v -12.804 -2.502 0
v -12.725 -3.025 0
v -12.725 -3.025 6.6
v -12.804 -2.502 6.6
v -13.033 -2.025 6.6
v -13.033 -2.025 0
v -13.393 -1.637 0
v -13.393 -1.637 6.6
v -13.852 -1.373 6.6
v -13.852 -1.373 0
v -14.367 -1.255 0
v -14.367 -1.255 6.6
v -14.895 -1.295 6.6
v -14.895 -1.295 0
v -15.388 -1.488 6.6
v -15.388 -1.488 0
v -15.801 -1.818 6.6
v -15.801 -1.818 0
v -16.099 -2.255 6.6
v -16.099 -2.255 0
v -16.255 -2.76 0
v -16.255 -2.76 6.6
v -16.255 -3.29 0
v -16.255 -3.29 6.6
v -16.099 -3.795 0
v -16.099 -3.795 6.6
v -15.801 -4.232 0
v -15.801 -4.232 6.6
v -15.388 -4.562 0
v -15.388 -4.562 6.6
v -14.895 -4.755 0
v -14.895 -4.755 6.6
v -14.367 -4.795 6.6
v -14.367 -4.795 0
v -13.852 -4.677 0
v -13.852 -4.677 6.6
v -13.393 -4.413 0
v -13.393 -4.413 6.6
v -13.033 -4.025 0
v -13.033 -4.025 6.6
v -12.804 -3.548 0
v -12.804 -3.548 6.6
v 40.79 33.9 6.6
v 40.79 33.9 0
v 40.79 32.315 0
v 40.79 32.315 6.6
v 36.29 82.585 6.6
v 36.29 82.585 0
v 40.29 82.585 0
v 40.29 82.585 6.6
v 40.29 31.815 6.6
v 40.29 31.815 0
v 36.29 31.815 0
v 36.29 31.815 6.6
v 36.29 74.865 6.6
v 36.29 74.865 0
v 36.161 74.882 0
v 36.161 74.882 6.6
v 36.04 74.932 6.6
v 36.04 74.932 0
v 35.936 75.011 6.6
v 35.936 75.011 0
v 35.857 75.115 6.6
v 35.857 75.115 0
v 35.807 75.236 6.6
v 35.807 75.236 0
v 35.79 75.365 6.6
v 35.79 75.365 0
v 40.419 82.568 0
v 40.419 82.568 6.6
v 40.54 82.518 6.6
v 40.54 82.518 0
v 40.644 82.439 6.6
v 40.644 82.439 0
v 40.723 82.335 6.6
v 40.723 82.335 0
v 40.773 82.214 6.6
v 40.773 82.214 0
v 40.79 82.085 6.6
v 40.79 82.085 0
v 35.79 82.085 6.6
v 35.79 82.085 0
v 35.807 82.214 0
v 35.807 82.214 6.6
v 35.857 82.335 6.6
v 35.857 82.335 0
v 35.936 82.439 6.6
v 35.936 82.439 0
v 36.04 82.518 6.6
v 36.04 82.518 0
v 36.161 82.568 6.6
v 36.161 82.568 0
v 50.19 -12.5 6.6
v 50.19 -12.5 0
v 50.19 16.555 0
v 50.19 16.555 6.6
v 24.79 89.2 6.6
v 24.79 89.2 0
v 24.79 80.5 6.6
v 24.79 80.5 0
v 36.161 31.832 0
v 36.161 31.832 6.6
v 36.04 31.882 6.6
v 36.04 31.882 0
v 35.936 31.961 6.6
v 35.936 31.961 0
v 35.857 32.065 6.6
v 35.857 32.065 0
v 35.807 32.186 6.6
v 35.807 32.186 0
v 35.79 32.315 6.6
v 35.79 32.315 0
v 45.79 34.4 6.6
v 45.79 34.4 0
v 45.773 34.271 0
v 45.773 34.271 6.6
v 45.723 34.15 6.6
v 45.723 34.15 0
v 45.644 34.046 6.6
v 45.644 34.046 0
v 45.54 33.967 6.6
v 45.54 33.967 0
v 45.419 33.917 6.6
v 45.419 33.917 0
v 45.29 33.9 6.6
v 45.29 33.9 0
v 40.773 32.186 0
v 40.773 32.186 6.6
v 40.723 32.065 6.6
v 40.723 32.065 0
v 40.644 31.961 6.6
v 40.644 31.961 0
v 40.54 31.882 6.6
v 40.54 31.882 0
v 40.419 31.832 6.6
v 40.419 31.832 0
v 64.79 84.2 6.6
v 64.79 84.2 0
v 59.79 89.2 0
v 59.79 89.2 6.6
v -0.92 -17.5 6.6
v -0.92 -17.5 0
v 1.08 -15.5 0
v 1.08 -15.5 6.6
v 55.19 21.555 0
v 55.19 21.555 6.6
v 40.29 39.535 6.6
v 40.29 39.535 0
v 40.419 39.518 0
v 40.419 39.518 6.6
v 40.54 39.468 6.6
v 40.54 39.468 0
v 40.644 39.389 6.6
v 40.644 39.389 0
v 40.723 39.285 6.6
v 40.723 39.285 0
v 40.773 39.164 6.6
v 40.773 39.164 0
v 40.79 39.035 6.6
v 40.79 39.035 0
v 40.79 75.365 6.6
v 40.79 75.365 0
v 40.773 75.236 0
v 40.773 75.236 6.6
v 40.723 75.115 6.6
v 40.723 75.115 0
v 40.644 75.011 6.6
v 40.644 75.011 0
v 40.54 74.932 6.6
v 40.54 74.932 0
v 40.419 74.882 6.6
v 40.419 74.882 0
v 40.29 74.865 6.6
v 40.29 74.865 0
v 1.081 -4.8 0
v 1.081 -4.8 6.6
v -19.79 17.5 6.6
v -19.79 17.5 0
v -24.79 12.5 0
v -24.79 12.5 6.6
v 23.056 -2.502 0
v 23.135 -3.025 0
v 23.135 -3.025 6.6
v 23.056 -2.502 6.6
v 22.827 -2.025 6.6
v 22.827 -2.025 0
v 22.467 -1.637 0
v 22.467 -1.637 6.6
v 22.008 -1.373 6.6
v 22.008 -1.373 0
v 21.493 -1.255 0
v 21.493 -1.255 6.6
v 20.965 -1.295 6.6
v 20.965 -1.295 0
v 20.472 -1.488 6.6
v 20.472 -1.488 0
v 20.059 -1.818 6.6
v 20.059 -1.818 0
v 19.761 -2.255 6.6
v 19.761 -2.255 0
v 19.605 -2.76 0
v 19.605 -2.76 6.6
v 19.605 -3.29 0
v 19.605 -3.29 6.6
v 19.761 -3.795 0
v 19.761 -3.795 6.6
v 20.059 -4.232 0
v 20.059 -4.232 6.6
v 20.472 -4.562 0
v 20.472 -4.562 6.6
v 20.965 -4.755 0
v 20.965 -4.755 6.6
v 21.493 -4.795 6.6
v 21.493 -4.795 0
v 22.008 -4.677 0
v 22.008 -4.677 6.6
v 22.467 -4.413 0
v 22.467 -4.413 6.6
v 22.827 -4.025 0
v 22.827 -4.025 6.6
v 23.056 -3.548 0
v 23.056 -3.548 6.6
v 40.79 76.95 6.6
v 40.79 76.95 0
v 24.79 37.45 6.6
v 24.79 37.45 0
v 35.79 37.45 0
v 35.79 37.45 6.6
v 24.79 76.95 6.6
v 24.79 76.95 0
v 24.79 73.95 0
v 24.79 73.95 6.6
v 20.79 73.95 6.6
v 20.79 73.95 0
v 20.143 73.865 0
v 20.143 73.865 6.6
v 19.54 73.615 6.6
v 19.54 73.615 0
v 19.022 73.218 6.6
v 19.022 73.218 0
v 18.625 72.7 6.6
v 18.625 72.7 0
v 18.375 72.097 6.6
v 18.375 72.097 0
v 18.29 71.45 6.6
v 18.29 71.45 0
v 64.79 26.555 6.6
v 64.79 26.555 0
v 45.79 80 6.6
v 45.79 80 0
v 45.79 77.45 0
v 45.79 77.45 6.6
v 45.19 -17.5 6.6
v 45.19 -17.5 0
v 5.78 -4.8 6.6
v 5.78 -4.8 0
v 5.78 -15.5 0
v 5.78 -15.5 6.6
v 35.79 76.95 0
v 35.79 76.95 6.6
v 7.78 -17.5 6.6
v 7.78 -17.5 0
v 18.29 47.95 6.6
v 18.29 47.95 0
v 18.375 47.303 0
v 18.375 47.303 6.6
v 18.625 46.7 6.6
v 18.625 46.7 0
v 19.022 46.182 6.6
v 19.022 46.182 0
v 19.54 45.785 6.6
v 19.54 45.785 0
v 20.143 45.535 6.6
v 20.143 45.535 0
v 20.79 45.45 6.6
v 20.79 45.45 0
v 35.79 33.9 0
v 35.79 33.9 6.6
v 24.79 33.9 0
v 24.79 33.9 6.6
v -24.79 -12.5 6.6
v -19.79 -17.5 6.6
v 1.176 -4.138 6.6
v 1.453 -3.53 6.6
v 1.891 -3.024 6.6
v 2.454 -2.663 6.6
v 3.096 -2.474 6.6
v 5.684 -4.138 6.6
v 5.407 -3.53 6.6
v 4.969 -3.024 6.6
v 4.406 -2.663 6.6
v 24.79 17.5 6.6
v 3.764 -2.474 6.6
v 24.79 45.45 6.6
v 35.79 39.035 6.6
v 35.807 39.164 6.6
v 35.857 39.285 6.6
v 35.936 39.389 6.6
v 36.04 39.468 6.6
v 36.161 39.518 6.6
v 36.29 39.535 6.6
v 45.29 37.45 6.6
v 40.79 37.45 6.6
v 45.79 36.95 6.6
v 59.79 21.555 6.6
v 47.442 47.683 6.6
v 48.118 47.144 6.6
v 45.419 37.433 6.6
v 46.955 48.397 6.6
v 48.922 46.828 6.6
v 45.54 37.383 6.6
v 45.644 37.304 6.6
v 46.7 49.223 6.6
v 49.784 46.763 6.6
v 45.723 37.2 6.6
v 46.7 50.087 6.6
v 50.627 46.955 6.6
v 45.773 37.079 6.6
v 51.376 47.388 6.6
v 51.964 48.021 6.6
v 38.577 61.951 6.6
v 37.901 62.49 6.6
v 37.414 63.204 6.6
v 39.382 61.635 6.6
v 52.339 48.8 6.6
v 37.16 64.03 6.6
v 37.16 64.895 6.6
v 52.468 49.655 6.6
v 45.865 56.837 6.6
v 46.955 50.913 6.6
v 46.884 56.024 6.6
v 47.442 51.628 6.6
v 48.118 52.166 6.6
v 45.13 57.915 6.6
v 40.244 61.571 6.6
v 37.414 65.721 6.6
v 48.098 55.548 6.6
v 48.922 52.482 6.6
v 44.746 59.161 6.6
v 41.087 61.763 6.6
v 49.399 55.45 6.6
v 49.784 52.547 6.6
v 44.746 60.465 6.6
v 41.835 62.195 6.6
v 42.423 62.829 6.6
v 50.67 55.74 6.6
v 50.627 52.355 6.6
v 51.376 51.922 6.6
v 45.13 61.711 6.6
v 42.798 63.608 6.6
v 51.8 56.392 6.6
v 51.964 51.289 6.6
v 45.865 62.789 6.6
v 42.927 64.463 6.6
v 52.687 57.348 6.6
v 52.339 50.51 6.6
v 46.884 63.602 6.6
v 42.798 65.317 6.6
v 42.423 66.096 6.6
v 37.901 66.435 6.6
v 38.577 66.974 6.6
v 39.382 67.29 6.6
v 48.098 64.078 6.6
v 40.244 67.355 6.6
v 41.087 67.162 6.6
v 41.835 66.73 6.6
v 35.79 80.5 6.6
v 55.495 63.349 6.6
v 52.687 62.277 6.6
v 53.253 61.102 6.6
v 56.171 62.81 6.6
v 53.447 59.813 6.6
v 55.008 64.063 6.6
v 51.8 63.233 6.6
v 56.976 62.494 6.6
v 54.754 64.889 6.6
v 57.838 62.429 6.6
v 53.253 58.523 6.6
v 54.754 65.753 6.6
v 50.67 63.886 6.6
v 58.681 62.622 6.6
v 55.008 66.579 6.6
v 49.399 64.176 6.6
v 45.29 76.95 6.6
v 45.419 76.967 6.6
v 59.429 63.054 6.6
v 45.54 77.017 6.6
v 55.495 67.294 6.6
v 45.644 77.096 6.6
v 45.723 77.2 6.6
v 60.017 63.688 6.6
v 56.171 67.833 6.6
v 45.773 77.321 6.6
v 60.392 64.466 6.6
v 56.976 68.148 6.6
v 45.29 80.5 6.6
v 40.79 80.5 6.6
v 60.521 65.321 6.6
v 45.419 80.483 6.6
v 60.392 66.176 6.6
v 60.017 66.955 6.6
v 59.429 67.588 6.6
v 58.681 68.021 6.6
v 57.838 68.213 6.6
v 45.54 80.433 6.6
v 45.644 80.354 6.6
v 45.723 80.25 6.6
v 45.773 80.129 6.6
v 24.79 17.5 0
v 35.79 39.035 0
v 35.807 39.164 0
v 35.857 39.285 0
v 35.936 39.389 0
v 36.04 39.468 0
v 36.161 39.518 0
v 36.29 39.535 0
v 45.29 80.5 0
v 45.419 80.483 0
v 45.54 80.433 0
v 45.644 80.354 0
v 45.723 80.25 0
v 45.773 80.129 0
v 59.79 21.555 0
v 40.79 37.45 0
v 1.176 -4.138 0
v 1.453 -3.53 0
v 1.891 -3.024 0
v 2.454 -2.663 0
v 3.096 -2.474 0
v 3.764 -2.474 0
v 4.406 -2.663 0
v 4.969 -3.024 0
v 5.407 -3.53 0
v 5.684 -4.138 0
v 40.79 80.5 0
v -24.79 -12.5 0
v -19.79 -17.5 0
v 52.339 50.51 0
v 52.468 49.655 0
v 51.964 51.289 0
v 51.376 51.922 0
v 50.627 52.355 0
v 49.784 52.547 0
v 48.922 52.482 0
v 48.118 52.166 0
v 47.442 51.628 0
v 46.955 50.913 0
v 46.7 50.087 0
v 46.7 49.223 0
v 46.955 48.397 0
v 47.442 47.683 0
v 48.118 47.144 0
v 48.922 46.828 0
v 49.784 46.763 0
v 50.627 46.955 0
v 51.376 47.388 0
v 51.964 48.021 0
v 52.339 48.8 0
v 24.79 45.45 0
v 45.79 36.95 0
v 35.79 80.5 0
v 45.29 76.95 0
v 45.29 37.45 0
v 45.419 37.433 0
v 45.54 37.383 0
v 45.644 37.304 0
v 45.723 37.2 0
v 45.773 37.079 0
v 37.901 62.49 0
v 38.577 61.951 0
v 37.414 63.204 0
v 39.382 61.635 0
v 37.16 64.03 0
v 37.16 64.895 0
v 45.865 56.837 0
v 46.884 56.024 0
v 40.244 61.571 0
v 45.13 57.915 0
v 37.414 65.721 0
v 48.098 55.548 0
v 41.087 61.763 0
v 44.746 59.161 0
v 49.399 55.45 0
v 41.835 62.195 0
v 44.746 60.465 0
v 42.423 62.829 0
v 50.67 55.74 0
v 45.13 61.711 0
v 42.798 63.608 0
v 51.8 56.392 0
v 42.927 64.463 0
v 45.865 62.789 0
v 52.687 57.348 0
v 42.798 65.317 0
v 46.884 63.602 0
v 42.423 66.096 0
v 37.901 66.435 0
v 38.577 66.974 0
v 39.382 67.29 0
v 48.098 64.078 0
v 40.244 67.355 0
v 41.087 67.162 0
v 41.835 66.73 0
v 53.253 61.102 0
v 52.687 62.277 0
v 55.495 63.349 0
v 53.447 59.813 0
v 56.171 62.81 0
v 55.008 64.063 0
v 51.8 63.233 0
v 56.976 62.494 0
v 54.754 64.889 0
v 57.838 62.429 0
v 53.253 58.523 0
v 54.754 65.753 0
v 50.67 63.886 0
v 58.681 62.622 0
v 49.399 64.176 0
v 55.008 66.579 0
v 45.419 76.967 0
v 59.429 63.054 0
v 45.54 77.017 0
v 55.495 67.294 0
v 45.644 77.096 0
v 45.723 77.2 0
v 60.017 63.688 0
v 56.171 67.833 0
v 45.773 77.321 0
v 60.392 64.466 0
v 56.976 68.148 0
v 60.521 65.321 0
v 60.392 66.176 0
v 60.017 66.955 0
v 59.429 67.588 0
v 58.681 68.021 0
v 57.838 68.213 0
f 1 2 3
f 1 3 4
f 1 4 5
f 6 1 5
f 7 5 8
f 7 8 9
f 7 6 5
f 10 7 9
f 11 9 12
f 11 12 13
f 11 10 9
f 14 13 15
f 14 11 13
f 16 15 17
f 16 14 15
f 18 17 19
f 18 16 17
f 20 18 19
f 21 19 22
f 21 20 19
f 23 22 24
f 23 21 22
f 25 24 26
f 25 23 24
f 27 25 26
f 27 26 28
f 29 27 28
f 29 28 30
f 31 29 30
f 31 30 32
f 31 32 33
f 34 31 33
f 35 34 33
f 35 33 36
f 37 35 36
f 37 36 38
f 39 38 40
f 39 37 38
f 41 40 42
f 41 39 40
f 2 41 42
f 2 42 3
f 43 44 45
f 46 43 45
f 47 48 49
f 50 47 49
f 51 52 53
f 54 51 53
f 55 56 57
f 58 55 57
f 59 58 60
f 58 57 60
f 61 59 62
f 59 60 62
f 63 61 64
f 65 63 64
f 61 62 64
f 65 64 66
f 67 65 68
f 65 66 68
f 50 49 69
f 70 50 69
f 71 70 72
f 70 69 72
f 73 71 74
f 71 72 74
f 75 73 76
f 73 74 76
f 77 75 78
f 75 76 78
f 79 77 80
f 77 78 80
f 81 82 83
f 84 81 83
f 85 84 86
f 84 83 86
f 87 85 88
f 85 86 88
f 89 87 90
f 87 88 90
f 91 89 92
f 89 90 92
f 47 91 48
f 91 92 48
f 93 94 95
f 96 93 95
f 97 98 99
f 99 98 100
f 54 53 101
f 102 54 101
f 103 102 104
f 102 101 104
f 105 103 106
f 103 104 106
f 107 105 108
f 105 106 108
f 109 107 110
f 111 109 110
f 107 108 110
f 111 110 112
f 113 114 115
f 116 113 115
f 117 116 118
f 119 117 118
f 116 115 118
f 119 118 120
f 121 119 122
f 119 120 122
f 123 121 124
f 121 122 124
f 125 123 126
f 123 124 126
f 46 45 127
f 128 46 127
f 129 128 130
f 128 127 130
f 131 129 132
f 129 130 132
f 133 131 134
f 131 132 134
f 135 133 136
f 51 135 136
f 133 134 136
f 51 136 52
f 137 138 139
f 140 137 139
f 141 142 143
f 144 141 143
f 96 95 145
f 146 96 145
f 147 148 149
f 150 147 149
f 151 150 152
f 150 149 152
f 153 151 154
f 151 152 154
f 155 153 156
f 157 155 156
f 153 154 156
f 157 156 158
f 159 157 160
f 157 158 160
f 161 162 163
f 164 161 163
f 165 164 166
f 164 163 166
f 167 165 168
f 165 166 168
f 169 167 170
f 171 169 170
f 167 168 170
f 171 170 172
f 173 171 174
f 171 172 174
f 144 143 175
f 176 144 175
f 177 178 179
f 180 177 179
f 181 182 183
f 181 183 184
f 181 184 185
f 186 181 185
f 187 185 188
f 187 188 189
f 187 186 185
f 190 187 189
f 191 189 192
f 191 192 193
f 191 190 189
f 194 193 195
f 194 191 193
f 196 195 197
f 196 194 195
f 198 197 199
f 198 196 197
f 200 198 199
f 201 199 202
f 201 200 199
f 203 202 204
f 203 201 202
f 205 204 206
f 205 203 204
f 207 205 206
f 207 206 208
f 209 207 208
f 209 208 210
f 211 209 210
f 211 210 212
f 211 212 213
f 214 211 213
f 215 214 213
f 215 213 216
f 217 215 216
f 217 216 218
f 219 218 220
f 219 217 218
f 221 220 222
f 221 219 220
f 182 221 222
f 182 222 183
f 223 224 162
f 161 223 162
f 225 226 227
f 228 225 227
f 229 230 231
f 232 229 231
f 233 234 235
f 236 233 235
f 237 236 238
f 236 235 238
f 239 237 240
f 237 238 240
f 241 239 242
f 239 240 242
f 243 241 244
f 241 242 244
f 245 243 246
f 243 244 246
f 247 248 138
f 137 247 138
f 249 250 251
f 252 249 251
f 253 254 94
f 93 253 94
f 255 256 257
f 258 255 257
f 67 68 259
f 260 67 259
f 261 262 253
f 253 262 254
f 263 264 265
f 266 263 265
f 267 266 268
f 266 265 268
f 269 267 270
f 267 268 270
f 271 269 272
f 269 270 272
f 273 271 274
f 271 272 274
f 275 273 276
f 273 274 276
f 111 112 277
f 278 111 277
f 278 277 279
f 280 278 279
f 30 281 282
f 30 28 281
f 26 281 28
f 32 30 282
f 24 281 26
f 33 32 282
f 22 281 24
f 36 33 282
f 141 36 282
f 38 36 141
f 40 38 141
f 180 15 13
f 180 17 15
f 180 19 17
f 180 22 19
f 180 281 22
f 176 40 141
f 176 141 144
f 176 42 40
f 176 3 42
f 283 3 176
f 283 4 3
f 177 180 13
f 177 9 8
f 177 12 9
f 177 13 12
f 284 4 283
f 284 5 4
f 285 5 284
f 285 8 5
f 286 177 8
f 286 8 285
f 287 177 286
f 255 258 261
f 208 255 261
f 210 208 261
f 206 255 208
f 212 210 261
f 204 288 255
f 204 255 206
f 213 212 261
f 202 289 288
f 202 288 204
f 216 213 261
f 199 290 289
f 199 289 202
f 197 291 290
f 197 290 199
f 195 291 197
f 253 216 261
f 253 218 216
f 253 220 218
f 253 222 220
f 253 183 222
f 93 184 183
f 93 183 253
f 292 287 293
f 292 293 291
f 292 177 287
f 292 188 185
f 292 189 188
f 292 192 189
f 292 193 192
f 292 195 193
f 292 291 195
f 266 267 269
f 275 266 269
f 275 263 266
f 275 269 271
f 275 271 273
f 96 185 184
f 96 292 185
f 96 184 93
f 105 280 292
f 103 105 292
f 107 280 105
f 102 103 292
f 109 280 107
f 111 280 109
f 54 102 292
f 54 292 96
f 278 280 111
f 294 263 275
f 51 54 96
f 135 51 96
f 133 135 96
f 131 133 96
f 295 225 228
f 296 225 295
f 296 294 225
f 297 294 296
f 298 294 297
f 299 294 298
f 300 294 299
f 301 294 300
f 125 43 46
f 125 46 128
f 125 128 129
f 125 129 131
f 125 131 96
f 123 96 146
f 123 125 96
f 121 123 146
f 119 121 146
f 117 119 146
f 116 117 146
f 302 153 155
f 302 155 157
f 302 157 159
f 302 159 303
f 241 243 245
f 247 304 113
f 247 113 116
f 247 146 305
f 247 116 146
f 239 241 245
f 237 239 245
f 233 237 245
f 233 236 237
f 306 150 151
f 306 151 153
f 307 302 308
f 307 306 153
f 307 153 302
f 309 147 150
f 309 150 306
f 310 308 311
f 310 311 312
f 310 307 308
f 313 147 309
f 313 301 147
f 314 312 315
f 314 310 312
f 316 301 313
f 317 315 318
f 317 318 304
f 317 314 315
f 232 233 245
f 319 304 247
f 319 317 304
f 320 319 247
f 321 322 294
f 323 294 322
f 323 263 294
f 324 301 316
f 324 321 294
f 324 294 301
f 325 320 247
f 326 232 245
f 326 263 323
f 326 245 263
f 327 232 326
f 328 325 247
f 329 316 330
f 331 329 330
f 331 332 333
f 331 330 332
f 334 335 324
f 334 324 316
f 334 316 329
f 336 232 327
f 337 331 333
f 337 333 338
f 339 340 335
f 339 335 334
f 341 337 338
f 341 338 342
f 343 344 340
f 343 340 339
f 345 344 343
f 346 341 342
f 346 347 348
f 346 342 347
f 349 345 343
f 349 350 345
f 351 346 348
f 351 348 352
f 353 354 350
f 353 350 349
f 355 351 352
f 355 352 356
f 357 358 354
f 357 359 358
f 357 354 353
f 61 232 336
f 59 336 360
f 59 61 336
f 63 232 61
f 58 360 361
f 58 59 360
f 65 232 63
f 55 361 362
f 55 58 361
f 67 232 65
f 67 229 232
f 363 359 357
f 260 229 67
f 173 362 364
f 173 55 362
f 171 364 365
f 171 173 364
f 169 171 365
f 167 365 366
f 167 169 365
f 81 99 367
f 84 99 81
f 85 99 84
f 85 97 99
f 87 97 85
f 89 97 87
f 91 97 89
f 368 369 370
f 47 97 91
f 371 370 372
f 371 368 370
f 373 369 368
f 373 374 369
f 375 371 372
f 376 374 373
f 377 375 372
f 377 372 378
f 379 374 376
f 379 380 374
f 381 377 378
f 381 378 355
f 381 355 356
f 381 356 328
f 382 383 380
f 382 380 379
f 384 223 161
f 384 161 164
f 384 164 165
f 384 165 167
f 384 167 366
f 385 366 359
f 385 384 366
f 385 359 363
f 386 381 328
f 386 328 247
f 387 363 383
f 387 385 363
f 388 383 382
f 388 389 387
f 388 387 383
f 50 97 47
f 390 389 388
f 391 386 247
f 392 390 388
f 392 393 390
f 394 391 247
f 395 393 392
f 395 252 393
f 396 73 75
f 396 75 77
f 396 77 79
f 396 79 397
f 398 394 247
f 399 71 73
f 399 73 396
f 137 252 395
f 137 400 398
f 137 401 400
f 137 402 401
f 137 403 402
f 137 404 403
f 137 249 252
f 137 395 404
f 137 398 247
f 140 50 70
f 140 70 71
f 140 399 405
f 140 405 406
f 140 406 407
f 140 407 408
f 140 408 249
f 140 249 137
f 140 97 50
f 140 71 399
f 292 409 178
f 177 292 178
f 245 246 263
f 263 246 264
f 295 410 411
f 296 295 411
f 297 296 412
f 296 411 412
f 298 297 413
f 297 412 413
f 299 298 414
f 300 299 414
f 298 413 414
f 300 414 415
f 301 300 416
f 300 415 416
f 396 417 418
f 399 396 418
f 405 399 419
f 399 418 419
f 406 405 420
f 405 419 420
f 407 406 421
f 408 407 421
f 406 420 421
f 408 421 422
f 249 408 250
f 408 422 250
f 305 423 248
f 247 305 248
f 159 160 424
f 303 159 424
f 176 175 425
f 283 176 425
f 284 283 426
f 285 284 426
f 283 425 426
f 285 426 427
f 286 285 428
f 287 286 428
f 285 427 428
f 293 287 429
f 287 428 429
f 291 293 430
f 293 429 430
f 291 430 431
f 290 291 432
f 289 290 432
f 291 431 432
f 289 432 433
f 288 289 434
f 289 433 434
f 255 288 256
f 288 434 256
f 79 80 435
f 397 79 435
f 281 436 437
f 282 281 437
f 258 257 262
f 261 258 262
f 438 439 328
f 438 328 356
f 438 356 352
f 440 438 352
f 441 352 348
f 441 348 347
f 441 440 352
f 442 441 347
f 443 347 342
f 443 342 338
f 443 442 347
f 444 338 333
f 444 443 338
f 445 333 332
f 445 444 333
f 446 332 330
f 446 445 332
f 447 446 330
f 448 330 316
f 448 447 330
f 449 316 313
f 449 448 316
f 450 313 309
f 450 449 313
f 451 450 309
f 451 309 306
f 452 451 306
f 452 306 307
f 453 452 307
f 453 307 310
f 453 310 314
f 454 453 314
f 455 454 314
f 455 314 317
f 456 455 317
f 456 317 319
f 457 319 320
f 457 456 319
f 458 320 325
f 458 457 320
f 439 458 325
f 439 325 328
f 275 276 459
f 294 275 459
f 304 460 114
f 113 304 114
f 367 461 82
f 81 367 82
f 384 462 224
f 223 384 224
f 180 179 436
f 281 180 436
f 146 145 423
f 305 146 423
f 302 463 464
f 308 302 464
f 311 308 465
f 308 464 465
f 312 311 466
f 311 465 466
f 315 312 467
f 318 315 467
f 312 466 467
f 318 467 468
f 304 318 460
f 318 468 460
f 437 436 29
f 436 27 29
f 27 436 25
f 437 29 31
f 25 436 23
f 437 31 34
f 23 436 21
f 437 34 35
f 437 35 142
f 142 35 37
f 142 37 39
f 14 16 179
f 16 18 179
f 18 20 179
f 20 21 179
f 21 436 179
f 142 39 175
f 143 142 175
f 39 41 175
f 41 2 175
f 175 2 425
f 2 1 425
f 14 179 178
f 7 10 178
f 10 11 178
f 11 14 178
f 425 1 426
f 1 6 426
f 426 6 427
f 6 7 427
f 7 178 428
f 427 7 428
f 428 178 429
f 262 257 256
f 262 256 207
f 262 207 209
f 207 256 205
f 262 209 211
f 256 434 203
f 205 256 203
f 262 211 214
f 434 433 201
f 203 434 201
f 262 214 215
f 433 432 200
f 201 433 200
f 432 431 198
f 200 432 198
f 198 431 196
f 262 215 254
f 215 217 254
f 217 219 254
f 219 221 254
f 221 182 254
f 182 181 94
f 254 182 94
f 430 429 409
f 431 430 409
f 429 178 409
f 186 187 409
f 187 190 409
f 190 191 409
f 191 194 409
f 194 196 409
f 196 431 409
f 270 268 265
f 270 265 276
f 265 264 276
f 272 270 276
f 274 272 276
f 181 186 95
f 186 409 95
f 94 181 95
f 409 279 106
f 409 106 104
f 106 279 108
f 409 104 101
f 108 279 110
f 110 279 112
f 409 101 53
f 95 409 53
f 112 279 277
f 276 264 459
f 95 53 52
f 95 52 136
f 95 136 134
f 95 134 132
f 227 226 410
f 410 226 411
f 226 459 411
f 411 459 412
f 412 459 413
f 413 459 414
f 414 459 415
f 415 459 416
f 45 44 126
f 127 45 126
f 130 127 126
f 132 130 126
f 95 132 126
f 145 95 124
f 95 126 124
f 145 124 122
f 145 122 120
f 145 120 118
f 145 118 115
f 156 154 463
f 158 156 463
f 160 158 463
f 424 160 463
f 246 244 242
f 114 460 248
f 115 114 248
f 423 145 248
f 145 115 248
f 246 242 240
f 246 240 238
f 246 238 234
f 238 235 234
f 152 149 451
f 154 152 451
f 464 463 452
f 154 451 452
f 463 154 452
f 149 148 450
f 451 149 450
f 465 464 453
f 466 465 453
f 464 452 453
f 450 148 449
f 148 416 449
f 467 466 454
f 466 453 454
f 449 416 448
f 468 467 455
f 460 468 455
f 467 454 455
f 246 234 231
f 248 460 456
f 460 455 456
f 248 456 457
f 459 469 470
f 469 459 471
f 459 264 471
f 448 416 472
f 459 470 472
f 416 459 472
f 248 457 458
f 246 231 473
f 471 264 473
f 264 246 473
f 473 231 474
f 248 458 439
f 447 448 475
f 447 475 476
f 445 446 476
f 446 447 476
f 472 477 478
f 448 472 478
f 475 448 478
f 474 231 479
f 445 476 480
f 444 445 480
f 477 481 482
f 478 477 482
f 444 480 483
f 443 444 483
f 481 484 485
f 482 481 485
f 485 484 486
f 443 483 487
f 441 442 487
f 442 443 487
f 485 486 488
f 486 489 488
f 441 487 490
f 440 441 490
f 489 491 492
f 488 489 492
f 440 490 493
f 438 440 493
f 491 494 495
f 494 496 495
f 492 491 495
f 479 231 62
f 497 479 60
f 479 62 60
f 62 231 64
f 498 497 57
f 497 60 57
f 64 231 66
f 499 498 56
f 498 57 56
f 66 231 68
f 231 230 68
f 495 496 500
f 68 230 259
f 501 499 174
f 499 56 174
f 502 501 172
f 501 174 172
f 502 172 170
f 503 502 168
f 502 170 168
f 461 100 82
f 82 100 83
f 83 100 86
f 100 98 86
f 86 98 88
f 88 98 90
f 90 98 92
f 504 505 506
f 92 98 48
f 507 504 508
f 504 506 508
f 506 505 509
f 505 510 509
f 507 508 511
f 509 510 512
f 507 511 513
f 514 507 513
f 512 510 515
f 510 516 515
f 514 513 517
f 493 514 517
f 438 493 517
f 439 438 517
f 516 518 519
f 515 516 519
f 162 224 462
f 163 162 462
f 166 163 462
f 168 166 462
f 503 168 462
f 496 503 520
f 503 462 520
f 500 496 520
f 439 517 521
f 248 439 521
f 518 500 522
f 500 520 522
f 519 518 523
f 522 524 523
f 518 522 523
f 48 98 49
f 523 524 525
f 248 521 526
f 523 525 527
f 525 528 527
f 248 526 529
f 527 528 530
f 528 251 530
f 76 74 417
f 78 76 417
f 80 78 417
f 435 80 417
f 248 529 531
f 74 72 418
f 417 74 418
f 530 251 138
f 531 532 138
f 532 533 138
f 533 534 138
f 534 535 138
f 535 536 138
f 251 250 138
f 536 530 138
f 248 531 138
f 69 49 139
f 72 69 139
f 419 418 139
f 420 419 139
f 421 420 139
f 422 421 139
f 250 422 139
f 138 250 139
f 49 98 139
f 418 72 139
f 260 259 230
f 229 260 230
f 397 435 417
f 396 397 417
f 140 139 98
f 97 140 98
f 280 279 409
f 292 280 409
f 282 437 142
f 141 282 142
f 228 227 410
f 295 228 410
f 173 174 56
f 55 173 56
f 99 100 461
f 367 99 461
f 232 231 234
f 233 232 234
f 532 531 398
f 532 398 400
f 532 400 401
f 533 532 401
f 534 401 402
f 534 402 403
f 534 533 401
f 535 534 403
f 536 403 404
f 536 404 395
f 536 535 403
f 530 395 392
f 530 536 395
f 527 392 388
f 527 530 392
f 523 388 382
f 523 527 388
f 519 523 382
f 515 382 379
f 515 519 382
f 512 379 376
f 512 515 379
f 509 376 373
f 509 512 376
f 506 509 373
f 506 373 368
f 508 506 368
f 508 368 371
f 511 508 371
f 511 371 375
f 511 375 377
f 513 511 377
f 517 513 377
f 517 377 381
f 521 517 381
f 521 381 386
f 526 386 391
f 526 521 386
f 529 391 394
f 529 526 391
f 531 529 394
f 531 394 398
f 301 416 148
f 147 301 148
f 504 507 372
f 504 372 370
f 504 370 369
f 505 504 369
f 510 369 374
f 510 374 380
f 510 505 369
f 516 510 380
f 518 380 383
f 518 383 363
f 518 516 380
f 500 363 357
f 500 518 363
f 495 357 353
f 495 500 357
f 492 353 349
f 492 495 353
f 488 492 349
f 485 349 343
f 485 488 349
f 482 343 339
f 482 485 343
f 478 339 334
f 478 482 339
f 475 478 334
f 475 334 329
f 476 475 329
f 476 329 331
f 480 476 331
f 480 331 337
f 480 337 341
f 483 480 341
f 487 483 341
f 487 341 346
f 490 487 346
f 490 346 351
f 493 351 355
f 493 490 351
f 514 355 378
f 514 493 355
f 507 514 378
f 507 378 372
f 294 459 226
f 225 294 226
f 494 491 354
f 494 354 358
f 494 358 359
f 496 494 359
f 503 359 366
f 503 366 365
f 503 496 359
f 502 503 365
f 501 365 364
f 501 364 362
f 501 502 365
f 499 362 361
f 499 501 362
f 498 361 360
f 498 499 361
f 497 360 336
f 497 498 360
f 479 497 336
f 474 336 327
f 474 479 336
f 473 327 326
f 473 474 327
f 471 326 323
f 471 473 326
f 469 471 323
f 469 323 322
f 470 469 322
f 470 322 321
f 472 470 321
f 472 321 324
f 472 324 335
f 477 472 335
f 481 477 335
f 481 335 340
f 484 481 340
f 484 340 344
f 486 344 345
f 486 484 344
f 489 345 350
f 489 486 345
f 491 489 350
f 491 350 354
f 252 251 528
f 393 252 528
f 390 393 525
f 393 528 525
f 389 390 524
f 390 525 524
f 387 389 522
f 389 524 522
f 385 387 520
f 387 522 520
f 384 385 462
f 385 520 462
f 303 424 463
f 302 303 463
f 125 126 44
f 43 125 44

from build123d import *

# Parameters (mm, degrees)
MODEL_R             = 4.375
MODEL_R_2           = 2.9
MODEL_R_3           = 1.775
BOSS_EXTRUDE1_DEPTH = 6.6


with BuildPart() as part:
    # Model → Boss-Extrude1 (new body)
    with BuildSketch(Plane.XY):
        with BuildLine():
            Line((-24.79, -12.5), (-19.79, -17.5))
            Line((-19.79, -17.5), (-0.9195, -17.5))
            Line((-0.9195, -17.5), (1.0805, -15.5))
            Line((1.0805, -15.5), (1.0805, -4.8))
            ThreePointArc((1.0805, -4.8), (3.43, -2.4505), (5.7795, -4.8))
            Line((5.7795, -4.8), (5.7795, -15.5))
            Line((5.7795, -15.5), (7.7795, -17.5))
            Line((7.7795, -17.5), (45.19, -17.5))
            Line((45.19, -17.5), (50.19, -12.5))
            Line((50.19, -12.5), (50.19, 16.555))
            Line((50.19, 16.555), (55.19, 21.555))
            Line((55.19, 21.555), (59.79, 21.555))
            Line((59.79, 21.555), (64.79, 26.555))
            Line((64.79, 26.555), (64.79, 84.19991216))
            Line((64.79, 84.19991216), (59.79, 89.19991216))
            Line((59.79, 89.19991216), (24.79, 89.19991216))
            Line((24.79, 89.19991216), (24.79, 80.500006241))
            Line((24.79, 80.500006241), (35.79, 80.500006241))
            Line((35.79, 80.500006241), (35.79, 82.085006241))
            ThreePointArc((35.79, 82.085006241), (35.936446609, 82.438559632), (36.29, 82.585006241))
            Line((36.29, 82.585006241), (40.29, 82.585006241))
            ThreePointArc((40.29, 82.585006241), (40.643553391, 82.438559632), (40.79, 82.085006241))
            Line((40.79, 82.085006241), (40.79, 80.500006241))
            Line((40.79, 80.500006241), (45.29, 80.500006241))
            ThreePointArc((45.29, 80.500006241), (45.643553391, 80.353559632), (45.79, 80.000006241))
            Line((45.79, 80.000006241), (45.79, 77.450006241))
            ThreePointArc((45.79, 77.450006241), (45.643553391, 77.09645285), (45.29, 76.950006241))
            Line((45.29, 76.950006241), (40.79, 76.950006241))
            Line((40.79, 76.950006241), (40.79, 75.365006241))
            ThreePointArc((40.79, 75.365006241), (40.643553391, 75.01145285), (40.29, 74.865006241))
            Line((40.29, 74.865006241), (36.29, 74.865006241))
            ThreePointArc((36.29, 74.865006241), (35.936446609, 75.01145285), (35.79, 75.365006241))
            Line((35.79, 75.365006241), (35.79, 76.950006241))
            Line((35.79, 76.950006241), (24.79, 76.950006241))
            Line((24.79, 76.950006241), (24.79, 73.950006241))
            Line((24.79, 73.950006241), (20.79, 73.950006241))
            ThreePointArc((20.79, 73.950006241), (19.022233047, 73.217773194), (18.29, 71.450006241))
            Line((18.29, 71.450006241), (18.29, 47.950006241))
            ThreePointArc((18.29, 47.950006241), (19.022233047, 46.182239288), (20.79, 45.450006241))
            Line((20.79, 45.450006241), (24.79, 45.450006241))
            Line((24.79, 45.450006241), (24.79, 37.450006241))
            Line((24.79, 37.450006241), (35.79, 37.450006241))
            Line((35.79, 37.450006241), (35.79, 39.035006241))
            ThreePointArc((35.79, 39.035006241), (35.936446609, 39.388559632), (36.29, 39.535006241))
            Line((36.29, 39.535006241), (40.29, 39.535006241))
            ThreePointArc((40.29, 39.535006241), (40.643553391, 39.388559632), (40.79, 39.035006241))
            Line((40.79, 39.035006241), (40.79, 37.450006241))
            Line((40.79, 37.450006241), (45.29, 37.450006241))
            ThreePointArc((45.29, 37.450006241), (45.643553391, 37.303559632), (45.79, 36.950006241))
            Line((45.79, 36.950006241), (45.79, 34.400006241))
            ThreePointArc((45.79, 34.400006241), (45.643553391, 34.04645285), (45.29, 33.900006241))
            Line((45.29, 33.900006241), (40.79, 33.900006241))
            Line((40.79, 33.900006241), (40.79, 32.315006241))
            ThreePointArc((40.79, 32.315006241), (40.643553391, 31.96145285), (40.29, 31.815006241))
            Line((40.29, 31.815006241), (36.29, 31.815006241))
            ThreePointArc((36.29, 31.815006241), (35.936446609, 31.96145285), (35.79, 32.315006241))
            Line((35.79, 32.315006241), (35.79, 33.900006241))
            Line((35.79, 33.900006241), (24.79, 33.900006241))
            Line((24.79, 33.900006241), (24.79, 17.5))
            Line((24.79, 17.5), (-19.79, 17.5))
            Line((-19.79, 17.5), (-24.79, 12.5))
            Line((-24.79, 12.5), (-24.79, -12.5))
        make_face()
        with Locations((49.071999999, 59.812938251)):
            Circle(MODEL_R, mode=Mode.SUBTRACT)
        with Locations((57.621173682, 65.321162043)):
            Circle(MODEL_R_2, mode=Mode.SUBTRACT)
        with Locations((40.027151425, 64.462627946)):
            Circle(MODEL_R_2, mode=Mode.SUBTRACT)
        with Locations((49.567674891, 49.655024765)):
            Circle(MODEL_R_2, mode=Mode.SUBTRACT)
        with Locations((-14.5, -3.025)):
            Circle(MODEL_R_3, mode=Mode.SUBTRACT)
        with Locations((21.36, -3.025)):
            Circle(MODEL_R_3, mode=Mode.SUBTRACT)
    extrude(amount=BOSS_EXTRUDE1_DEPTH)


solid = part.part
